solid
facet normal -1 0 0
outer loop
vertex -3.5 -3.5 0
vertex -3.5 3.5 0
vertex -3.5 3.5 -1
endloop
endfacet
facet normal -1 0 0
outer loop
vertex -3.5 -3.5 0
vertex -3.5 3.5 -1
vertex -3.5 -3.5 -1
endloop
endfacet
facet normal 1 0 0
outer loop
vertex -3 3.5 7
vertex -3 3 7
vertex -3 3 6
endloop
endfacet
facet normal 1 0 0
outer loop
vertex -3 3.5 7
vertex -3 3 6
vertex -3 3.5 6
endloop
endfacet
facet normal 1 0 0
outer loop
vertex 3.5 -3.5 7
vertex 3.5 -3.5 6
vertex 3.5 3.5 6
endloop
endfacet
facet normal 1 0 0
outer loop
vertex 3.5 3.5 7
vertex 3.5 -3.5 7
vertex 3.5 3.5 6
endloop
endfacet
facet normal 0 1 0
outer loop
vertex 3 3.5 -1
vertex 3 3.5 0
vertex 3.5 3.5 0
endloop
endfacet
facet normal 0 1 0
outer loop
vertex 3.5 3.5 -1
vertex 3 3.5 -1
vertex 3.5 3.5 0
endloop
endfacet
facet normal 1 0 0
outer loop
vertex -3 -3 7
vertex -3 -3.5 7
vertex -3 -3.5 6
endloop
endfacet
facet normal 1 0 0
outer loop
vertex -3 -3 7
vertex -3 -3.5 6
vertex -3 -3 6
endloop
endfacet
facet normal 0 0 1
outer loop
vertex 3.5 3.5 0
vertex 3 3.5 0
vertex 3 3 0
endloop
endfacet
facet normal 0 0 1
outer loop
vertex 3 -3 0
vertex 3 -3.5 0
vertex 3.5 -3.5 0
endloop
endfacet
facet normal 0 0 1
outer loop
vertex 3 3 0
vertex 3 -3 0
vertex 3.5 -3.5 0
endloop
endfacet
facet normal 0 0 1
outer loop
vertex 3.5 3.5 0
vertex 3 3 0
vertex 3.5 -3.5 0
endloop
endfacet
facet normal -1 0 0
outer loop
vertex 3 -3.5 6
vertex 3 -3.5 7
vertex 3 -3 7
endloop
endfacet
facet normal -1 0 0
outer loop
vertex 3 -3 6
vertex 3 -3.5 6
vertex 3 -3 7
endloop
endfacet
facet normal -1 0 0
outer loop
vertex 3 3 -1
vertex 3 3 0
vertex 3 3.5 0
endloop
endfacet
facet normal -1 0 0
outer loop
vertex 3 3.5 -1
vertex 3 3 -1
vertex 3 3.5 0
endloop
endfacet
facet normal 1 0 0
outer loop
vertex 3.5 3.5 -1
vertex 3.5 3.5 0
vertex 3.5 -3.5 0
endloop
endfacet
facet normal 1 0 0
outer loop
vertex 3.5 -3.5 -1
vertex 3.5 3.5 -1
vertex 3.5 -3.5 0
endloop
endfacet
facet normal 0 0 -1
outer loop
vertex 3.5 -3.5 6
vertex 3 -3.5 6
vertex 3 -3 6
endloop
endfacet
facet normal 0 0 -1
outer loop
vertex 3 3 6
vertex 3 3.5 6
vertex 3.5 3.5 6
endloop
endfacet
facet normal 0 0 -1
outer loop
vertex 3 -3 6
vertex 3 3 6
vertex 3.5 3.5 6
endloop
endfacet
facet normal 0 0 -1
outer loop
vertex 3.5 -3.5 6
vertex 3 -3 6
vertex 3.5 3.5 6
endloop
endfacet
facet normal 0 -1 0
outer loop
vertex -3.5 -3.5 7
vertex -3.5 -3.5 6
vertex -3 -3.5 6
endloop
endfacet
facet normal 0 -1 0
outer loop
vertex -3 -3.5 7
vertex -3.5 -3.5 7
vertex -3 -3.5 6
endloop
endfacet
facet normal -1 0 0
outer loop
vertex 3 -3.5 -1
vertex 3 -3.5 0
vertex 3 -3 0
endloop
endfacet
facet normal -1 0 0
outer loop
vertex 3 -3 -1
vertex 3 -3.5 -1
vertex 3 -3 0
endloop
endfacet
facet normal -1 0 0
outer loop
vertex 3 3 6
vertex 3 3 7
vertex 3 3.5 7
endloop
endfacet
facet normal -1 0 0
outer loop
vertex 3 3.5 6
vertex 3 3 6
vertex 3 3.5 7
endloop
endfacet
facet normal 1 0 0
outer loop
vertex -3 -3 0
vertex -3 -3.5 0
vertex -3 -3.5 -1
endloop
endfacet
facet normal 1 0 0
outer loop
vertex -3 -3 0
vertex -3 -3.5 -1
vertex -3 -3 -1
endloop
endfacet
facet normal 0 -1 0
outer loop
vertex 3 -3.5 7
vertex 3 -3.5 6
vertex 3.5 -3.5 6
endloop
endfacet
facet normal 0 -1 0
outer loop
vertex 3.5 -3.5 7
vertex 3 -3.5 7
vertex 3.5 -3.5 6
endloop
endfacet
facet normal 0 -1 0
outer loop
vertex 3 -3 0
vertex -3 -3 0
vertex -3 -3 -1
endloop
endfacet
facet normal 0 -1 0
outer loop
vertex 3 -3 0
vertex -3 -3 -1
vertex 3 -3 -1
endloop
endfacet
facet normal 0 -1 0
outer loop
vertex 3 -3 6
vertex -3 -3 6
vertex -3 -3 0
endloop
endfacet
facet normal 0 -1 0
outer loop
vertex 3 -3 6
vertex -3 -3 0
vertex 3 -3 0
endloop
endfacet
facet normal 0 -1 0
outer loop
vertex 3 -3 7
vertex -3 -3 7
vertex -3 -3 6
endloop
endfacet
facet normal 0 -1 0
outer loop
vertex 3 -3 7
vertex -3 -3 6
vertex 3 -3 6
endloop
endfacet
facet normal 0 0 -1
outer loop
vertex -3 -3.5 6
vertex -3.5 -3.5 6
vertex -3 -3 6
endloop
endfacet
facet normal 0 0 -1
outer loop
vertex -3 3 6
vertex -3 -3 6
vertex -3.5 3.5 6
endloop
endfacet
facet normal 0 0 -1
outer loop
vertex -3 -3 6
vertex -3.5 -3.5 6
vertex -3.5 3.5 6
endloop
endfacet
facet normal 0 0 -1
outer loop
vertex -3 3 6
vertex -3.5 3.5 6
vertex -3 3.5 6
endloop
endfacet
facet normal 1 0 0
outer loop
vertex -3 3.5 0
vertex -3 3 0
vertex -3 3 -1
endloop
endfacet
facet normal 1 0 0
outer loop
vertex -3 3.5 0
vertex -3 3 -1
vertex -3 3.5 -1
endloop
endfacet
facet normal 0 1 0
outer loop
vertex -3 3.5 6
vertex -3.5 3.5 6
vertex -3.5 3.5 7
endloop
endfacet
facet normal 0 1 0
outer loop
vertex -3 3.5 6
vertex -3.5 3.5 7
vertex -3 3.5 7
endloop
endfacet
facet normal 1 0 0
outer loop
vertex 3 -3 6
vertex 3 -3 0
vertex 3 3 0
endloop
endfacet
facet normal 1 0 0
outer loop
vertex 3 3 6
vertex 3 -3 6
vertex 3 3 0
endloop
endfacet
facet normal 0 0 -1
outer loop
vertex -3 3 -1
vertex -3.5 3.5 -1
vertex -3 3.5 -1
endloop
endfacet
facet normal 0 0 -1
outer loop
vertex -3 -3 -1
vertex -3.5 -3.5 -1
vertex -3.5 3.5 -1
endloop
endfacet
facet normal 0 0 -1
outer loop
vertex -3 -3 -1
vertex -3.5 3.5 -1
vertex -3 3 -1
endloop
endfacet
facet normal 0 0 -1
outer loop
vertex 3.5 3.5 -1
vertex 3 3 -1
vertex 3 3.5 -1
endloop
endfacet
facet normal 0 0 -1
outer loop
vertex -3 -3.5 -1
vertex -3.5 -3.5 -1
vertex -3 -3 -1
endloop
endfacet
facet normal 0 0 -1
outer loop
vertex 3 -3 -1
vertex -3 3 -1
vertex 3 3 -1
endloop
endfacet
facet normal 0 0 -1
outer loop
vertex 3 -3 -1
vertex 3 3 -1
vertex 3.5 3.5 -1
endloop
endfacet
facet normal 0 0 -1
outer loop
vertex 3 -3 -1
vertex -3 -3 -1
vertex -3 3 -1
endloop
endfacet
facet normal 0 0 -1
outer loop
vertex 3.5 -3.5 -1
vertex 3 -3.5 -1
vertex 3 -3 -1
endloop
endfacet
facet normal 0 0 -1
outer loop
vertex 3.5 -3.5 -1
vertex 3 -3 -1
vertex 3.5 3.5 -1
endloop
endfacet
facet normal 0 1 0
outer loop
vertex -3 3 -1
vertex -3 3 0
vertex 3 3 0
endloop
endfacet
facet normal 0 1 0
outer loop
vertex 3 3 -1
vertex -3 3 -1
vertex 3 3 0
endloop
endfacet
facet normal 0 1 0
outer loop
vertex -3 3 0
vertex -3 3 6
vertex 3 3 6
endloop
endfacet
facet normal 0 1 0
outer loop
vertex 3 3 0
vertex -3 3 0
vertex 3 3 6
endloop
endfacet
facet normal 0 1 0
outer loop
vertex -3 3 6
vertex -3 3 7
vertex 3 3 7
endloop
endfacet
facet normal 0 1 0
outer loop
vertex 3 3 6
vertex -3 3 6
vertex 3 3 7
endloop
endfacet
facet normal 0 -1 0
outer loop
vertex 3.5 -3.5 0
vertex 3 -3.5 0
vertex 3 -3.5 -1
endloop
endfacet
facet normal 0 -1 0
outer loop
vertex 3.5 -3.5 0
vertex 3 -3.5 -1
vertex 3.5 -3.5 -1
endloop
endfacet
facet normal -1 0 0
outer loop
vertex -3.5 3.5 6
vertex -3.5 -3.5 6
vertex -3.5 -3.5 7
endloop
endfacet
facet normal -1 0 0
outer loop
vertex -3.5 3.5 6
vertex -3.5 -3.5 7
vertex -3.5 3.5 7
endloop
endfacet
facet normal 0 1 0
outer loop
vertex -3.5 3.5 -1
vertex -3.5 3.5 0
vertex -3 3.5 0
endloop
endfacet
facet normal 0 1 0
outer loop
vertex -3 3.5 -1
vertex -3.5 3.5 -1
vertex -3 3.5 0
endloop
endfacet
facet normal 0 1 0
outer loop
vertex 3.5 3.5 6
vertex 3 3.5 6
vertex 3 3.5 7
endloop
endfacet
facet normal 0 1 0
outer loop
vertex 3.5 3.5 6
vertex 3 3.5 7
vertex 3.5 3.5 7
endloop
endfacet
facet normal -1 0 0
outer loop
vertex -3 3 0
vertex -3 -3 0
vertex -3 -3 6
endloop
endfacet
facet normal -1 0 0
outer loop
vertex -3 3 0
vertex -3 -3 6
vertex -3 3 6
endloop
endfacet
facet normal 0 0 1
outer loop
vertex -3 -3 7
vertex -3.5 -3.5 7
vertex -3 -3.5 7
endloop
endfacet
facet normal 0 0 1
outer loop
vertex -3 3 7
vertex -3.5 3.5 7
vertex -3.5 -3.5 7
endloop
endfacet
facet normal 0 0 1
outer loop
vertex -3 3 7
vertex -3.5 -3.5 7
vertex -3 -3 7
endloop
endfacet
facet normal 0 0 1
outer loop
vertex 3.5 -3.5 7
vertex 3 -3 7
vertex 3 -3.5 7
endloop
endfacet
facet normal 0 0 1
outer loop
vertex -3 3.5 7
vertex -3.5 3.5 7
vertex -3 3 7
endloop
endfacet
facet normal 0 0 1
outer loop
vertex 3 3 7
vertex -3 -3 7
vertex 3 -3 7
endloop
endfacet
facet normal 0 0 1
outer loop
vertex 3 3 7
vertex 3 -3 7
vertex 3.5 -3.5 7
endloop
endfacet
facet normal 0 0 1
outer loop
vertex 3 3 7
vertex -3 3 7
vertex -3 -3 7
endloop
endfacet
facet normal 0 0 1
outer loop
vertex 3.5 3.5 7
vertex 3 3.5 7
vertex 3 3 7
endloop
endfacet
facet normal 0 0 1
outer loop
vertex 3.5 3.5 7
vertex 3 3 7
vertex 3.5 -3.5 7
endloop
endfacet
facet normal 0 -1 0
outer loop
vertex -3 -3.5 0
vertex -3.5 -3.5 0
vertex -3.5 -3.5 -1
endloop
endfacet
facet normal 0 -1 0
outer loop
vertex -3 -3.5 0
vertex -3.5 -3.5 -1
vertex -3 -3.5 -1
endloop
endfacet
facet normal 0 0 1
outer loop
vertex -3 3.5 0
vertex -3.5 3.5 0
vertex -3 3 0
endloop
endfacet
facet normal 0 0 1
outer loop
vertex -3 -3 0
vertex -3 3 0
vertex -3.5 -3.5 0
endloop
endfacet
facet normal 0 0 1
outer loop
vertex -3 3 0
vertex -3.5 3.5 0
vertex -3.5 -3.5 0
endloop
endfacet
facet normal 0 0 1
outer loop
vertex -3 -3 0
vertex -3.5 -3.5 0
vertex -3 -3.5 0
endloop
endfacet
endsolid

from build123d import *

# Parameters (mm, degrees)
F0_W     = 6
F0_H     = 6
F1_DEPTH = 6
F2_W     = 7
F2_H     = 7
F3_DEPTH = 1
F4_W     = 7
F4_H     = 7
F5_DEPTH = 1
F6_W     = 6
F6_H     = 0.5
F7_DEPTH = 8.001


with BuildPart() as f1:
    # F0 (on Top) → F1 (new body)
    with BuildSketch(Plane.XY):
        Rectangle(F0_W, F0_H)
    extrude(amount=F1_DEPTH)

    # F2 (on face) → F3 (join)
    with BuildSketch(Plane.XY.offset(6)):
        Rectangle(F2_W, F2_H)
    extrude(amount=F3_DEPTH)

    # F4 (on face) → F5 (join)
    with BuildSketch(Plane(origin=(0, 0, 0), x_dir=(1, 0, 0), z_dir=(0, 0, -1))):
        Rectangle(F4_W, F4_H)
    extrude(amount=F5_DEPTH)

    # F6 (on face) → F7 (cut, through all)
    with BuildSketch(Plane.XY.offset(7)):
        with Locations((0, 3.25)):
            Rectangle(F6_W, F6_H)
        with Locations((0, -3.25)):
            Rectangle(F6_W, F6_H)
    extrude(amount=-F7_DEPTH, mode=Mode.SUBTRACT)


solid = f1.part
